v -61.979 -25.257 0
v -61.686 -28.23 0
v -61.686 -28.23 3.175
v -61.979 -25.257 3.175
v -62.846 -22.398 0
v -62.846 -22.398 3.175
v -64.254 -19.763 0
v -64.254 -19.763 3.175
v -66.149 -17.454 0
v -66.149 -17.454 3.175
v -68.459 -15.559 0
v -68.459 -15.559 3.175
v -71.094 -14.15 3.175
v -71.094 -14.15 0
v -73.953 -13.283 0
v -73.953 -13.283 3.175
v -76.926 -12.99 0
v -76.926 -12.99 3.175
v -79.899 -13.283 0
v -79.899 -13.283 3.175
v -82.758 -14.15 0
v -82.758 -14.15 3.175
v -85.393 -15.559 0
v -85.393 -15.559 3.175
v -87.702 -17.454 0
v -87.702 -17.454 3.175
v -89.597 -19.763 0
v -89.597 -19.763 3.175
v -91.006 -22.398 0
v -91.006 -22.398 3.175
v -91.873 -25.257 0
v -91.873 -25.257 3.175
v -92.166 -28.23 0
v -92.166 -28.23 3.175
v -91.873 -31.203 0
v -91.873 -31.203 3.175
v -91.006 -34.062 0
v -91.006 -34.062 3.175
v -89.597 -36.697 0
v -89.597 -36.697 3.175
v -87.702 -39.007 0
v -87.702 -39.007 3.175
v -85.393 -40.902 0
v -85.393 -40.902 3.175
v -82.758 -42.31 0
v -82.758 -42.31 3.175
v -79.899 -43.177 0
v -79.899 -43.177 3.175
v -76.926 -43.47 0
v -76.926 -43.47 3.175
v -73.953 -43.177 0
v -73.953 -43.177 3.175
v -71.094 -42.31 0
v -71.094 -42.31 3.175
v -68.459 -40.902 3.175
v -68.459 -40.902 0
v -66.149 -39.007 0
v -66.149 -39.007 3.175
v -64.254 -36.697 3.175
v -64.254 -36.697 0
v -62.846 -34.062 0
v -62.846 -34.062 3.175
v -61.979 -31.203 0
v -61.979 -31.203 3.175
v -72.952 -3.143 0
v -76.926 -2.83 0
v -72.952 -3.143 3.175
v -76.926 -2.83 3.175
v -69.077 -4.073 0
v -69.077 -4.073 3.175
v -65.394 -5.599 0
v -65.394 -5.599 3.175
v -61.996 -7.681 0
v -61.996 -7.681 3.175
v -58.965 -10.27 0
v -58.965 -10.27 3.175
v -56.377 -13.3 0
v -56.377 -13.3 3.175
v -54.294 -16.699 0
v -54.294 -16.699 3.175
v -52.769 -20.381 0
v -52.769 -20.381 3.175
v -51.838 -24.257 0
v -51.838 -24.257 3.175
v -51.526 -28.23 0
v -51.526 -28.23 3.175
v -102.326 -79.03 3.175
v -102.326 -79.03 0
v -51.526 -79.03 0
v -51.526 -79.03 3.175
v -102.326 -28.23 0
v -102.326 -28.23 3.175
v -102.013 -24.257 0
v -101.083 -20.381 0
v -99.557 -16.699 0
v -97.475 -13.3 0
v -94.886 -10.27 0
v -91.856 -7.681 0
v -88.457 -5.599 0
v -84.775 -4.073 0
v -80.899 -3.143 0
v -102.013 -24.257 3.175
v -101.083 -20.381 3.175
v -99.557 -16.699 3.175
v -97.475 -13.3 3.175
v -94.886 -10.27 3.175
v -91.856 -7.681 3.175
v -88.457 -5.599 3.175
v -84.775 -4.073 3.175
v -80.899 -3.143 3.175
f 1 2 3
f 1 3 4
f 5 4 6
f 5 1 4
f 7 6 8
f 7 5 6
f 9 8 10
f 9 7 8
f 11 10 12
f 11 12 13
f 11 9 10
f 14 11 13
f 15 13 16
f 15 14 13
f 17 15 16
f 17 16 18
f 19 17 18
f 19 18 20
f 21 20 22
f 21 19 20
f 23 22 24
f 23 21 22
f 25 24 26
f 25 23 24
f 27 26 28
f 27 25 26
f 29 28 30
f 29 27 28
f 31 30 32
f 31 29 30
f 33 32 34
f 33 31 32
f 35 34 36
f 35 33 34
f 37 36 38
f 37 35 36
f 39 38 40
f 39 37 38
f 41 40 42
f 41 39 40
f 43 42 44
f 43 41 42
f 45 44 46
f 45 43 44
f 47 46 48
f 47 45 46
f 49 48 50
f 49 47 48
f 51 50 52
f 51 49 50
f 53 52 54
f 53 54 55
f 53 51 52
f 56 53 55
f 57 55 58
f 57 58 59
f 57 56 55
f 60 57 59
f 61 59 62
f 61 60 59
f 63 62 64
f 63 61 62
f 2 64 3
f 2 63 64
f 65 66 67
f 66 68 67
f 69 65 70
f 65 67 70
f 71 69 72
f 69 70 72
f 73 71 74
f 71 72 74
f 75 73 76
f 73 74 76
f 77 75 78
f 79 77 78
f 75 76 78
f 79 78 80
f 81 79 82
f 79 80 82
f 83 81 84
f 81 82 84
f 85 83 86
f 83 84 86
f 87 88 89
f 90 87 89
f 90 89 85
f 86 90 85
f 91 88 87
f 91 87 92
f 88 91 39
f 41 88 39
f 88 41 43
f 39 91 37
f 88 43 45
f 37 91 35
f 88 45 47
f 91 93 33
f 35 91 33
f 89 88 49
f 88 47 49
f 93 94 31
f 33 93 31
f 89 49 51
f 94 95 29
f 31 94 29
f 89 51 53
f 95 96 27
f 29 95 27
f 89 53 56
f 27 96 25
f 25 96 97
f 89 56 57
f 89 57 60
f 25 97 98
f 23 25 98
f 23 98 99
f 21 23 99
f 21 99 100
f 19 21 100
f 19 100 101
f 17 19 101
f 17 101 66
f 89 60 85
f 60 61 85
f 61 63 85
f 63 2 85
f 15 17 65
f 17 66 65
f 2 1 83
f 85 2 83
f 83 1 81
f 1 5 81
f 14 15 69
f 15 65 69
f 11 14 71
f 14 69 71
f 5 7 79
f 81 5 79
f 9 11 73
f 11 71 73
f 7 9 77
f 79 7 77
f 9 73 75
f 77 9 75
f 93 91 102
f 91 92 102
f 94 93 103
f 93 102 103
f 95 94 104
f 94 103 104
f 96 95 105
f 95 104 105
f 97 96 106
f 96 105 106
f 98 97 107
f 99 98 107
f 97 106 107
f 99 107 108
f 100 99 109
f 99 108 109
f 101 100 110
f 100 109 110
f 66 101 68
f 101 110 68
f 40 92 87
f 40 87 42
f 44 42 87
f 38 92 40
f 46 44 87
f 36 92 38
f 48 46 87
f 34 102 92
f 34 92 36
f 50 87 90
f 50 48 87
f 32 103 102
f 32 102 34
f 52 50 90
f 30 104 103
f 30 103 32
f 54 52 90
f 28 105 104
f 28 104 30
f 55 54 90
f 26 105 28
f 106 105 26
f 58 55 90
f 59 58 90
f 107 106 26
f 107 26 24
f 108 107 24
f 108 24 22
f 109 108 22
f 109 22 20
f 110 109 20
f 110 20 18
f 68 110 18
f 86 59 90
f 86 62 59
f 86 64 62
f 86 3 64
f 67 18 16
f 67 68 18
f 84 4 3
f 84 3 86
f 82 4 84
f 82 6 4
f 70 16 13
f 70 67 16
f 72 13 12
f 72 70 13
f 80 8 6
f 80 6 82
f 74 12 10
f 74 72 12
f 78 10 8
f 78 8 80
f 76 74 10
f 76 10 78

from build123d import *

# Parameters (mm, degrees)
SKETCH1_W           = 50.8
SKETCH1_H           = 76.2
SKETCH1_R           = 15.24
BOSS_EXTRUDE1_DEPTH = 3.175
FILLET1_R           = 25.4


with BuildPart() as part:
    # Sketch1 → Boss-Extrude1 (new body)
    with BuildSketch(Plane.XY):
        with Locations((-76.925714286, -40.930285714)):
            Rectangle(SKETCH1_W, SKETCH1_H)
        with Locations((-76.925714286, -28.230285714)):
            Circle(SKETCH1_R, mode=Mode.SUBTRACT)
    extrude(amount=BOSS_EXTRUDE1_DEPTH)

    # Fillet1
    fillet1_edges = [part.edges().sort_by_distance(p)[0] for p in [
        (-102.325714286, -2.830285714, 1.5875),
        (-51.525714286, -2.830285714, 1.5875),
    ]]
    fillet(fillet1_edges, radius=FILLET1_R - 0.0001)  # a hair under: the kernel refuses the full size


solid = part.part
